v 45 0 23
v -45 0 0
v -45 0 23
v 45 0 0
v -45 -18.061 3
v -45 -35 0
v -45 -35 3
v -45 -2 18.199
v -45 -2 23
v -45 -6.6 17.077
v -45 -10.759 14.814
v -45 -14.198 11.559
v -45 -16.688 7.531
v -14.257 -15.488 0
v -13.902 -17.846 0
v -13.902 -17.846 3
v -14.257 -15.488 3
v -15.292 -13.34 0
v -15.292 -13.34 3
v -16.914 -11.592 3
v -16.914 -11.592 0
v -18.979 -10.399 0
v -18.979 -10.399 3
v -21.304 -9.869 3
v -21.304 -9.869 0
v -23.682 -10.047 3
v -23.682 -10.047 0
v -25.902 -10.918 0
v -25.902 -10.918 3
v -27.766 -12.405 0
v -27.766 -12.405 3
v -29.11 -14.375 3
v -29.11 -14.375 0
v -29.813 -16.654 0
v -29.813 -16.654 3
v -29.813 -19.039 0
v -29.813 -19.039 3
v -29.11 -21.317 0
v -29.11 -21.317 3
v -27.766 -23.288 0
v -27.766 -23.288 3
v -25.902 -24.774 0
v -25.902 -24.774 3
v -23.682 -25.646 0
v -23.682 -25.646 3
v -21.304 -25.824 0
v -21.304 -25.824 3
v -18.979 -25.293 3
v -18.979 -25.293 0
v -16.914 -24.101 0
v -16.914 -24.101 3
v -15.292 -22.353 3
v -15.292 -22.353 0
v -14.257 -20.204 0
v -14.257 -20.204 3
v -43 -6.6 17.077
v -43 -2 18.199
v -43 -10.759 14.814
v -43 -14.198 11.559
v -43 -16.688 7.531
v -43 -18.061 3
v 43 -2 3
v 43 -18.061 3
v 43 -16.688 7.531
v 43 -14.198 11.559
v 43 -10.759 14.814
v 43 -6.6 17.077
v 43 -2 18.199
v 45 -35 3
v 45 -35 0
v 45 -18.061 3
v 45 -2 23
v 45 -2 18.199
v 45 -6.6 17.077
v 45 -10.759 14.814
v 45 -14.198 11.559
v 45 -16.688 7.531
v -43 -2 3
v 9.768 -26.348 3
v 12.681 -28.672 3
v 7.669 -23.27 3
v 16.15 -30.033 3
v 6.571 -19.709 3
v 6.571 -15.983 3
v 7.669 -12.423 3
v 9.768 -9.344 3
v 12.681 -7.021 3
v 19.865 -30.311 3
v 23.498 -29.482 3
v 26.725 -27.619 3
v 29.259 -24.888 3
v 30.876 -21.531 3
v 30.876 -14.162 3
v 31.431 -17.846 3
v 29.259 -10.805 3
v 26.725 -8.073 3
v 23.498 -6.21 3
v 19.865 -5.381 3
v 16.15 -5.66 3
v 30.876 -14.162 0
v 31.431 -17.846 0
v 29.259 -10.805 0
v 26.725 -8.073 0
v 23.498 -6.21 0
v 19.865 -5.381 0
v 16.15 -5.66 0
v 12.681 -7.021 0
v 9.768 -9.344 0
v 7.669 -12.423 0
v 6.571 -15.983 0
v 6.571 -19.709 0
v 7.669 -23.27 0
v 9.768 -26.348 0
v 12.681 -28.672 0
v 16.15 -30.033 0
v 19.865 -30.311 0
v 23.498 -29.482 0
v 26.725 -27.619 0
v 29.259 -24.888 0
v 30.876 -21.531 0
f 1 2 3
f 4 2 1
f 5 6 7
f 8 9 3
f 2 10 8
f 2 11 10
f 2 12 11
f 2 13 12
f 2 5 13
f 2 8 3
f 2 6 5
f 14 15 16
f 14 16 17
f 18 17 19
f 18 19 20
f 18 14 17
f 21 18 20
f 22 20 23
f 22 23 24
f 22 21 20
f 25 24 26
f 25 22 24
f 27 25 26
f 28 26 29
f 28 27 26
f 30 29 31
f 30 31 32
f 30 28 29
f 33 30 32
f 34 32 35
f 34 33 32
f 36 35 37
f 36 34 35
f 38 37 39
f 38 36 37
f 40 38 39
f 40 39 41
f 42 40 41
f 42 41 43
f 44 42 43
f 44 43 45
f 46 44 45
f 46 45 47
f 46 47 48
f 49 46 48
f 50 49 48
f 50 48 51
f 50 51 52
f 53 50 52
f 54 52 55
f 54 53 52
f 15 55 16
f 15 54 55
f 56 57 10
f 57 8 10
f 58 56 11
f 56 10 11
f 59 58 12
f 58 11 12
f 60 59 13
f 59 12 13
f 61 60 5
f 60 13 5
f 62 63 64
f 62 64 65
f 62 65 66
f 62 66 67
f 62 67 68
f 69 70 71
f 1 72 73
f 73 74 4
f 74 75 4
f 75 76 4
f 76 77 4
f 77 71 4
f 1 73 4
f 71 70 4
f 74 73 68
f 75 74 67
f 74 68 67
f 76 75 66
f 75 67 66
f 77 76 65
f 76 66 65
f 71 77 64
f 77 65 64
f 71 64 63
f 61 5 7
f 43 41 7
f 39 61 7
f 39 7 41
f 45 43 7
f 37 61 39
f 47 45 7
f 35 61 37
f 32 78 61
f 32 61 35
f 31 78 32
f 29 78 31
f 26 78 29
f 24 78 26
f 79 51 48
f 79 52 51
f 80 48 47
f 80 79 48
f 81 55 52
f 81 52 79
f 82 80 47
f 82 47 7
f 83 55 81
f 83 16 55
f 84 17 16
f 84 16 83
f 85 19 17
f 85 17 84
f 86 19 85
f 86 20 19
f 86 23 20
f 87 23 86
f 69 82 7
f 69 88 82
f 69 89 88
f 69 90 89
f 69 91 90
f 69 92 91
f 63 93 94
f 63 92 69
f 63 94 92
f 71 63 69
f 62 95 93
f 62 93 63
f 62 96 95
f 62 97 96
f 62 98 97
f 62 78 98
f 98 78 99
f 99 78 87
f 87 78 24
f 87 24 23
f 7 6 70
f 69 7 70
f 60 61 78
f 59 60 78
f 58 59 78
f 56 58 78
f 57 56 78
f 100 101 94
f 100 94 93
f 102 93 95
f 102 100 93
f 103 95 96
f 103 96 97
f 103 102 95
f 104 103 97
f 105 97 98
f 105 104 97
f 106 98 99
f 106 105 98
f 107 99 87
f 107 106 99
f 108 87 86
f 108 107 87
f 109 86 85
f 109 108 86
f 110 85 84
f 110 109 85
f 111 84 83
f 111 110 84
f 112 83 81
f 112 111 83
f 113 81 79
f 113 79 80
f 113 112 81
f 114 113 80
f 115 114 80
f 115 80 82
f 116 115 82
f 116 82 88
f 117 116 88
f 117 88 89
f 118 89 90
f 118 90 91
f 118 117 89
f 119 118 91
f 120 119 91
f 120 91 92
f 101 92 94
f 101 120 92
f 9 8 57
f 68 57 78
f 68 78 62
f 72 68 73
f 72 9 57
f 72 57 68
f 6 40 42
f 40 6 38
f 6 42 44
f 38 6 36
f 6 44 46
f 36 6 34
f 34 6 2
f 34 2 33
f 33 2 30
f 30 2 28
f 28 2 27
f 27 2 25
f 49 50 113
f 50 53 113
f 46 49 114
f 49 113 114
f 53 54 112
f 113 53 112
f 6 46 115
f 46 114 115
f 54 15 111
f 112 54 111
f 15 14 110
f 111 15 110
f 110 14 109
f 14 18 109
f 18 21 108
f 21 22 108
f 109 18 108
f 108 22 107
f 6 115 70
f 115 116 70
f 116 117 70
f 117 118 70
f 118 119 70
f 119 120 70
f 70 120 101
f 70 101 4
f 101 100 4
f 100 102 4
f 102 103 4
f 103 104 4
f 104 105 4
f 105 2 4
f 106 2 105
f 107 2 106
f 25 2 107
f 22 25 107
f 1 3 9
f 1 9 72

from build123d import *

# Parameters (mm, degrees)
F0_W          = 90
F0_H          = 35
F1_DEPTH      = 3
F2_W          = 90
F2_H          = 23
F3_DEPTH      = 2
F5_DEPTH      = 45
F5_DEPTH_BACK = 45
F7_START      = 3
F6_W          = 86
F6_H          = 33
F7_DEPTH      = 32.9
F8_R          = 12.5
F8_R_2        = 8
F9_DEPTH      = 3


with BuildPart() as f1:
    # F0 (on Top) → F1 (new body)
    with BuildSketch(Plane.XY):
        with Locations((0, -17.5)):
            Rectangle(F0_W, F0_H)
    extrude(amount=F1_DEPTH)

    # F2 (on Front) → F3 (join)
    with BuildSketch(Plane.XZ):
        with Locations((0, 11.5)):
            Rectangle(F2_W, F2_H)
    extrude(amount=F3_DEPTH)

    # F4 (on Right) → F5 (join, two sides)
    with BuildSketch(Plane.YZ) as f5_sk:
        with BuildLine():
            Line((-18.3083641247, 0), (0, 0))
            Line((0, 0), (0, 18.3083641247))
            ThreePointArc((0, 18.3083641247), (-12.945968425, 12.945968425), (-18.3083641247, 0))
        make_face()
    extrude(amount=F5_DEPTH)
    extrude(f5_sk.sketch, amount=-F5_DEPTH_BACK)

    # F6 (on Top) → F7 (cut)
    with BuildSketch(Plane.XY.offset(F7_START)):
        with Locations((0, -18.5)):
            Rectangle(F6_W, F6_H)
    extrude(amount=F7_DEPTH, mode=Mode.SUBTRACT)

    # F8 (on Top) → F9 (cut)
    with BuildSketch(Plane.XY):
        with Locations((18.9312342554, -17.8462527692)):
            Circle(F8_R)
        with Locations((-21.9019707292, -17.8462527692)):
            Circle(F8_R_2)
    extrude(amount=F9_DEPTH, mode=Mode.SUBTRACT)


solid = f1.part
